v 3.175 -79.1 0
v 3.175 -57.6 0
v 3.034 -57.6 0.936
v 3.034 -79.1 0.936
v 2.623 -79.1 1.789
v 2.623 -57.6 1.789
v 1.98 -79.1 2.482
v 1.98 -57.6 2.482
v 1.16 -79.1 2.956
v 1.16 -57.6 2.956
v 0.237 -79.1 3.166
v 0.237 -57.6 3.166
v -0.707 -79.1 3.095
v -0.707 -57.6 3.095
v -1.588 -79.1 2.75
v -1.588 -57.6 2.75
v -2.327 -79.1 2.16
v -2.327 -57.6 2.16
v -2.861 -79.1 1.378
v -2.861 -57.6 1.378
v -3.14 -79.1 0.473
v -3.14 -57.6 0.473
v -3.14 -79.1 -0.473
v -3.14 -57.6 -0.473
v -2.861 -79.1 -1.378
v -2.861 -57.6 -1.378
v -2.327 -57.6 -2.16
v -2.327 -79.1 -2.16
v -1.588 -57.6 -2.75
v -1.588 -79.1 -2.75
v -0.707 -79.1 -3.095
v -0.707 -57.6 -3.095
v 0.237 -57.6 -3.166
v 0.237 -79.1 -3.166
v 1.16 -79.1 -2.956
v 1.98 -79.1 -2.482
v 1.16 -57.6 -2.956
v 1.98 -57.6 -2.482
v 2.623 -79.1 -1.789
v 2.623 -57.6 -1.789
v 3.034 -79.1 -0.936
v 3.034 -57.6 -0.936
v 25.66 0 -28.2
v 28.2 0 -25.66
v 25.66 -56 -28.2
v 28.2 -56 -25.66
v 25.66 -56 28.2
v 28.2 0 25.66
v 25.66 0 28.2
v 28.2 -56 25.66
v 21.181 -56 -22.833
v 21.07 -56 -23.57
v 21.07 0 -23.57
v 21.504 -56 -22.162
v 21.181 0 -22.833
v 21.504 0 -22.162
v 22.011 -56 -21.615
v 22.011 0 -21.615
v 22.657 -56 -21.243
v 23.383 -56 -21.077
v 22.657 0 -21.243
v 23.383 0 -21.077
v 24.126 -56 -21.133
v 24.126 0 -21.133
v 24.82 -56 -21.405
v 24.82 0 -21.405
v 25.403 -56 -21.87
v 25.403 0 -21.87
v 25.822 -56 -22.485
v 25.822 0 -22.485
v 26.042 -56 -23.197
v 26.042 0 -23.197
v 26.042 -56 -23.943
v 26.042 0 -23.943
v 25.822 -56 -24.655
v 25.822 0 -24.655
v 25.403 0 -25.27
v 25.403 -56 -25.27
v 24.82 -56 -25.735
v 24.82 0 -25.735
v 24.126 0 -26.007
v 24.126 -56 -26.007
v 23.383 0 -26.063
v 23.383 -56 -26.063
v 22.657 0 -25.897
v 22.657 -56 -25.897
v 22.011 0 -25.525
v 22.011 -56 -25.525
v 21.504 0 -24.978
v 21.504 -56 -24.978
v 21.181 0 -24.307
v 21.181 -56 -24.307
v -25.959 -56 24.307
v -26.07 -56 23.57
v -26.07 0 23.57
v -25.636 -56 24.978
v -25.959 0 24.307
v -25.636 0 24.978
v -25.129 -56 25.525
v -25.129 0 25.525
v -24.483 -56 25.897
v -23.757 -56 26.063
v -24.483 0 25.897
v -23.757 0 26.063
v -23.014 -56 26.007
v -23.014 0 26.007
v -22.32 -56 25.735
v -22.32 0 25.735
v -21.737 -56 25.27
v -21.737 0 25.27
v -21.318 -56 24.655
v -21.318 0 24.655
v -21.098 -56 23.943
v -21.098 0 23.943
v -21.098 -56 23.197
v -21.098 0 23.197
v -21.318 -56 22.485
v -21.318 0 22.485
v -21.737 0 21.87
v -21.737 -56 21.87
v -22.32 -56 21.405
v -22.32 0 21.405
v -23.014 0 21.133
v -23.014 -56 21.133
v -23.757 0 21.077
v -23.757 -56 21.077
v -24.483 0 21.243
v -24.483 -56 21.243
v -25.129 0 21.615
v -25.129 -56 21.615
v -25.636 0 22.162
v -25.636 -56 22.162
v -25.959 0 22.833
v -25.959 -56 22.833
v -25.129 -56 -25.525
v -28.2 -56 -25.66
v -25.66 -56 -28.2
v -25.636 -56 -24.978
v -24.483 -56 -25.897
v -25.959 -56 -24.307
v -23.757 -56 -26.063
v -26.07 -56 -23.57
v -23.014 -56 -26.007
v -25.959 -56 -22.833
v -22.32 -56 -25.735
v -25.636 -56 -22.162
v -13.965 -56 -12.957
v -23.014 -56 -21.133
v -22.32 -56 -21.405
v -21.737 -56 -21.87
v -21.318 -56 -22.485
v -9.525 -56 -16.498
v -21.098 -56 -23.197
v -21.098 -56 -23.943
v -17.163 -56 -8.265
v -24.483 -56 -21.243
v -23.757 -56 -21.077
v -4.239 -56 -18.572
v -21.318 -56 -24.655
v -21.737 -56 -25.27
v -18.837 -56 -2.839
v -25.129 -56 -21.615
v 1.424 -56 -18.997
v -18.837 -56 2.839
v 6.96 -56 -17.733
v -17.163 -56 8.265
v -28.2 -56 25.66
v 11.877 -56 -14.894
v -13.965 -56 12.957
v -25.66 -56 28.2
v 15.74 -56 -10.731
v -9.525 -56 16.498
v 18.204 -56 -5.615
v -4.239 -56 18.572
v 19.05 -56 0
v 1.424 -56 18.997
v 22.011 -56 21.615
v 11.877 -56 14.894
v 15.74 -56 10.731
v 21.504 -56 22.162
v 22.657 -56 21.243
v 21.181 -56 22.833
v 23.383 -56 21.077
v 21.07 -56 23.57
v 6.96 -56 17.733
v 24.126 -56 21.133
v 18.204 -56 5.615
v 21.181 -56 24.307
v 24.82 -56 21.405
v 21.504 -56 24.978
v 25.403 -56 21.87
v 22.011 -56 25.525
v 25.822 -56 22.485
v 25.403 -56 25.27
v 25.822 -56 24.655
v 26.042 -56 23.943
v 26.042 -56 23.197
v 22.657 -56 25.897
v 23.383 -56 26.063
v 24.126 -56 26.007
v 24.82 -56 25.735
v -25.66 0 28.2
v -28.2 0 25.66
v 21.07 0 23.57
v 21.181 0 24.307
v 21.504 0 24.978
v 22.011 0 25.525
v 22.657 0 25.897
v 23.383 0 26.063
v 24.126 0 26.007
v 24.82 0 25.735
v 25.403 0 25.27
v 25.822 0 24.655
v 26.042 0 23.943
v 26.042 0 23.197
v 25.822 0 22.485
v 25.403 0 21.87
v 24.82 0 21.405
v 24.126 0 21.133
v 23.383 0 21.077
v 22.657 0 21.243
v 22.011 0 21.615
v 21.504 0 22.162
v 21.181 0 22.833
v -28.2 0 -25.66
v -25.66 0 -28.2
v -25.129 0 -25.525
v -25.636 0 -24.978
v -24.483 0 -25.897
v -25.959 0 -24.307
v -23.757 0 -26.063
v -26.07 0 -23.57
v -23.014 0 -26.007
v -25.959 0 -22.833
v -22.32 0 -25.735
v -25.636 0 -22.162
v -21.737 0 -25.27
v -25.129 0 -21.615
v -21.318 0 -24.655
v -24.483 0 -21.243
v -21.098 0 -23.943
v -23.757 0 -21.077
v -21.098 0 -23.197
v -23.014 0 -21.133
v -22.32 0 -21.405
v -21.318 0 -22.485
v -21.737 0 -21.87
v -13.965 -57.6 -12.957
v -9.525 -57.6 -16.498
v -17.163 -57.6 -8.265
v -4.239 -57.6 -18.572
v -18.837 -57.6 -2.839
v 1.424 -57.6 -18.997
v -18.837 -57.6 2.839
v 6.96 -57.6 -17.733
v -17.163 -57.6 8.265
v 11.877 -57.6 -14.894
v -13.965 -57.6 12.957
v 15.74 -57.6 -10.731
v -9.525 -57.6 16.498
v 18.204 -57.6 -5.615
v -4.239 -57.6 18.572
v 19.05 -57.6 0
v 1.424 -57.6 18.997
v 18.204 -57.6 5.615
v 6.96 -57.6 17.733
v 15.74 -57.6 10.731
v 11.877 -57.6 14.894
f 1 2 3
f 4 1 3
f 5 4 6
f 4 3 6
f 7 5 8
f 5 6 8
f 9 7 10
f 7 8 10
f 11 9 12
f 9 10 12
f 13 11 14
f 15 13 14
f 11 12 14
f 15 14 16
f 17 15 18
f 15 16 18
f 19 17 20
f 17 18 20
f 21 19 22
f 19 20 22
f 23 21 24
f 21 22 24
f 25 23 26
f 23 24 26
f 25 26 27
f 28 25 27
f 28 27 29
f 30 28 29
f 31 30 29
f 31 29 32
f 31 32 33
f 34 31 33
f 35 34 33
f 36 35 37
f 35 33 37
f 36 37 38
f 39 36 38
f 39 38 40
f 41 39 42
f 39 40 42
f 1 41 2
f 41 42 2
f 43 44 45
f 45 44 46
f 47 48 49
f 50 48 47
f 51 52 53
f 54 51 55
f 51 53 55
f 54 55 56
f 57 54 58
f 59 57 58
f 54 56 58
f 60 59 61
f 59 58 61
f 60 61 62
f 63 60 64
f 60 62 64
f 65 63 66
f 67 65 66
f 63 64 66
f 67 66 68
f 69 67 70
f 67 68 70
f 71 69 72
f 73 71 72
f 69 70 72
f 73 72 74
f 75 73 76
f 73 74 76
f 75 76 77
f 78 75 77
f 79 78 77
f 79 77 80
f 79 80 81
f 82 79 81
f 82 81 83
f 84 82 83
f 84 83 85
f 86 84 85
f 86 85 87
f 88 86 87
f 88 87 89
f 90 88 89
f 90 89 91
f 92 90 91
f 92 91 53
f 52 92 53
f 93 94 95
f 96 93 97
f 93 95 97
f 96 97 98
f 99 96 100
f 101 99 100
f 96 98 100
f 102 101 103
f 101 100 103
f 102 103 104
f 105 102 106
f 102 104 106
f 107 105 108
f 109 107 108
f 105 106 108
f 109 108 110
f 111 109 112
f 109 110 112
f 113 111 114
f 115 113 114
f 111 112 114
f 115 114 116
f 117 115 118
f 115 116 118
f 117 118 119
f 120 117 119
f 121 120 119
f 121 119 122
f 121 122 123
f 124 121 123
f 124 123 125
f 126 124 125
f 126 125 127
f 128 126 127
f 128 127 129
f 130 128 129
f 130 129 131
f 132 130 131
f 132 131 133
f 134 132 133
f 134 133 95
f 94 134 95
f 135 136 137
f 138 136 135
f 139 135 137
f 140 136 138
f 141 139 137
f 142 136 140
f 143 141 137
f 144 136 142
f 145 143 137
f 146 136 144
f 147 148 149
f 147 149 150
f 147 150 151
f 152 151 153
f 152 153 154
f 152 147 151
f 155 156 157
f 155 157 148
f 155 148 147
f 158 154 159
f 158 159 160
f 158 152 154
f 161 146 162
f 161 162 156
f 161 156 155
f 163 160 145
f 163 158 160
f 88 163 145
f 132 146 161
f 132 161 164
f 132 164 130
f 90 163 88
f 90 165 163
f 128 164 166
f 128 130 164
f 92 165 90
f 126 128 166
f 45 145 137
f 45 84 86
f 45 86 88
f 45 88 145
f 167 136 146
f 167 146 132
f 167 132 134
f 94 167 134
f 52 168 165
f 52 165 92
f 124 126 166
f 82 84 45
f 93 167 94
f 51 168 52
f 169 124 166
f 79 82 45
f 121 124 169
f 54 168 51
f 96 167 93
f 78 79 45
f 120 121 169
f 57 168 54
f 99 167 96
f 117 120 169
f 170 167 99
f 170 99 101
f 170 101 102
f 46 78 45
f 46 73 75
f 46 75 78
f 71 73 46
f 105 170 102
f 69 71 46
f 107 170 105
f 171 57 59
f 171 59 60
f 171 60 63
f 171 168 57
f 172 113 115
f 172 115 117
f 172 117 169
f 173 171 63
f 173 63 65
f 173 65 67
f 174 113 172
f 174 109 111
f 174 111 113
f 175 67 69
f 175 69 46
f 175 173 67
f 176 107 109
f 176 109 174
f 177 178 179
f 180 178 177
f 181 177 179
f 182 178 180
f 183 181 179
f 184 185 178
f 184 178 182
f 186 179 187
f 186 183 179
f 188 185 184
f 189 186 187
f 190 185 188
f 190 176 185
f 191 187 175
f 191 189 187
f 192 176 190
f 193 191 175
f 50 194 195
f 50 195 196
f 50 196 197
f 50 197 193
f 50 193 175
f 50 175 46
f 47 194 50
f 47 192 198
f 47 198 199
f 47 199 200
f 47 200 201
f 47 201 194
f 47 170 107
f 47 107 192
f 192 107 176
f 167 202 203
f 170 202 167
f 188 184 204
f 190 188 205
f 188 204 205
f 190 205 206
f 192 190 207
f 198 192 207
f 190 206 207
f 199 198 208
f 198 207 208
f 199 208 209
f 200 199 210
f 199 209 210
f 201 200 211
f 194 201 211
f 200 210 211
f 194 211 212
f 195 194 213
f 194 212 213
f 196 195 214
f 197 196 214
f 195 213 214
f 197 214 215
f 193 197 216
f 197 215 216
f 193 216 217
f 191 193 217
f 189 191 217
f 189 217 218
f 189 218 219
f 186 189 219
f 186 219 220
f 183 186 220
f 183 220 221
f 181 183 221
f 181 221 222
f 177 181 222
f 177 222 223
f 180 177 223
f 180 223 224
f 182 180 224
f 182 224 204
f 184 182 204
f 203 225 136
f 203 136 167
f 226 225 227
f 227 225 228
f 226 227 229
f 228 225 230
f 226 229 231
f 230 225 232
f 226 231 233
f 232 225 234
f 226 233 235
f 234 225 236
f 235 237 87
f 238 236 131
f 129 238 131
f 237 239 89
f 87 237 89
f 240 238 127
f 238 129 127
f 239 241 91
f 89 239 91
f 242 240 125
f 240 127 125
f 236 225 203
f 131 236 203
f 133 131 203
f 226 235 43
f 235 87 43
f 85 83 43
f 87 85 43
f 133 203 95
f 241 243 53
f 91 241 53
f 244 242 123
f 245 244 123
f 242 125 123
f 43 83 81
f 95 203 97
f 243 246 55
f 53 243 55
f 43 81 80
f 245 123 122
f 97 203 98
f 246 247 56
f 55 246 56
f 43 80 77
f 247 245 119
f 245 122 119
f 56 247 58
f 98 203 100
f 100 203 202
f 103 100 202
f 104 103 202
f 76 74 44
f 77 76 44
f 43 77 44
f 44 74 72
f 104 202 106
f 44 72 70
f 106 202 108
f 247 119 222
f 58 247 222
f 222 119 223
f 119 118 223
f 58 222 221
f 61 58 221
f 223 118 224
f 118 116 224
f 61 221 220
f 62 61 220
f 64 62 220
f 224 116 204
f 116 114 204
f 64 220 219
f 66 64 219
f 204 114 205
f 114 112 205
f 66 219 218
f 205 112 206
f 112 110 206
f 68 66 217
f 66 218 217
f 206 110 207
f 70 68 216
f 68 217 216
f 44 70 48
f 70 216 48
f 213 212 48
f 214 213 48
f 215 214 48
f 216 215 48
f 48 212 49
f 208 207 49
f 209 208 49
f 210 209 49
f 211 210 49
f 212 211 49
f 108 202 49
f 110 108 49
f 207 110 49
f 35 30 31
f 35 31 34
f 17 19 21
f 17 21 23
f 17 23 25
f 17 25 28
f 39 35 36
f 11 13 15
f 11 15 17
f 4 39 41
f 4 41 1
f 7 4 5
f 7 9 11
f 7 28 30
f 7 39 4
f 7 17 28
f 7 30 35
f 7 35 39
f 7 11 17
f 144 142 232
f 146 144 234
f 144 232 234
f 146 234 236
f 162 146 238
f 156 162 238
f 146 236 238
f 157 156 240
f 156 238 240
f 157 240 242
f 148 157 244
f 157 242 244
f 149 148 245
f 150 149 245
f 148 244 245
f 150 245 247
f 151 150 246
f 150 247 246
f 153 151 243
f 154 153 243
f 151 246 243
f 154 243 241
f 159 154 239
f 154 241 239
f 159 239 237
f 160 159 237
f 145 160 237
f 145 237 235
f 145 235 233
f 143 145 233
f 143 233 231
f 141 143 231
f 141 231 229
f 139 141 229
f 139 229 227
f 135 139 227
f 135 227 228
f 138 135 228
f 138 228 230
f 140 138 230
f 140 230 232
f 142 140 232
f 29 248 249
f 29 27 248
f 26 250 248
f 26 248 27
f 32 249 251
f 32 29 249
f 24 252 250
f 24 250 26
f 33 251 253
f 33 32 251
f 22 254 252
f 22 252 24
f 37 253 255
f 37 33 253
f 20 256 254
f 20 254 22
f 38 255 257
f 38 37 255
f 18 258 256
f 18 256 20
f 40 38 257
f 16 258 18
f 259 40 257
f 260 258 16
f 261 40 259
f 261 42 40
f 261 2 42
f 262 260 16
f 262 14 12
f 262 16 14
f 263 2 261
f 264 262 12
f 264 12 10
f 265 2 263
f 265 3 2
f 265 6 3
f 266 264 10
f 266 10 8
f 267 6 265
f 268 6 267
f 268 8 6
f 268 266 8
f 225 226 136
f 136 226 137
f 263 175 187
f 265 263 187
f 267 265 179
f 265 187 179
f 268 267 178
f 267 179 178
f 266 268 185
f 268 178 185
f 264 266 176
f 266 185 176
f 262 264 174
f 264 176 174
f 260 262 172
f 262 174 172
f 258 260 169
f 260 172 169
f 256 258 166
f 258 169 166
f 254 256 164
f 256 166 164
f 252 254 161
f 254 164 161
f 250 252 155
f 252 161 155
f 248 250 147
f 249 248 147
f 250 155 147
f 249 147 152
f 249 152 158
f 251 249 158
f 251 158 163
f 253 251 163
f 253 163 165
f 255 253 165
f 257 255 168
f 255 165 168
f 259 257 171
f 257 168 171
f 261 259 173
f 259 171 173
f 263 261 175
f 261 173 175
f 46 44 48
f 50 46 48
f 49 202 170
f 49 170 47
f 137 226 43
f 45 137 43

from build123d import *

# Parameters (mm, degrees)
F0_W     = 56.4
F0_H     = 56.4
F1_DEPTH = 56
F2_R     = 19.05
F3_DEPTH = 1.6
F4_R     = 3.175
F5_DEPTH = 21.5
F6_R     = 2.5
F7_DEPTH = 79.101
F8_SIZE  = 2.54


with BuildPart() as f1:
    # F0 (on Front) → F1 (new body)
    with BuildSketch(Plane.XZ):
        Rectangle(F0_W, F0_H)
    extrude(amount=F1_DEPTH)

    # F2 (on face) → F3 (join)
    with BuildSketch(Plane.XZ.offset(56)):
        Circle(F2_R)
    extrude(amount=F3_DEPTH)

    # F4 (on face) → F5 (join)
    with BuildSketch(Plane.XZ.offset(57.6)):
        Circle(F4_R)
    extrude(amount=F5_DEPTH)

    # F6 (on face) → F7 (cut, through all)
    with BuildSketch(Plane(origin=(0, 0, 0), x_dir=(-1, 0, 0), z_dir=(0, 1, 0))):
        with Locations((23.57, 23.57)):
            Circle(F6_R)
        with Locations((23.57, -23.57)):
            Circle(F6_R)
        with Locations((-23.57, -23.57)):
            Circle(F6_R)
        with Locations((-23.57, 23.57)):
            Circle(F6_R)
    extrude(amount=-F7_DEPTH, mode=Mode.SUBTRACT)

    # F8
    f8_edges = [f1.edges().sort_by_distance(p)[0] for p in [
        (28.2, -28, 28.2),
        (-28.2, -28, 28.2),
        (-28.2, -28, -28.2),
        (28.2, -28, -28.2),
    ]]
    chamfer(f8_edges, length=F8_SIZE)


solid = f1.part
